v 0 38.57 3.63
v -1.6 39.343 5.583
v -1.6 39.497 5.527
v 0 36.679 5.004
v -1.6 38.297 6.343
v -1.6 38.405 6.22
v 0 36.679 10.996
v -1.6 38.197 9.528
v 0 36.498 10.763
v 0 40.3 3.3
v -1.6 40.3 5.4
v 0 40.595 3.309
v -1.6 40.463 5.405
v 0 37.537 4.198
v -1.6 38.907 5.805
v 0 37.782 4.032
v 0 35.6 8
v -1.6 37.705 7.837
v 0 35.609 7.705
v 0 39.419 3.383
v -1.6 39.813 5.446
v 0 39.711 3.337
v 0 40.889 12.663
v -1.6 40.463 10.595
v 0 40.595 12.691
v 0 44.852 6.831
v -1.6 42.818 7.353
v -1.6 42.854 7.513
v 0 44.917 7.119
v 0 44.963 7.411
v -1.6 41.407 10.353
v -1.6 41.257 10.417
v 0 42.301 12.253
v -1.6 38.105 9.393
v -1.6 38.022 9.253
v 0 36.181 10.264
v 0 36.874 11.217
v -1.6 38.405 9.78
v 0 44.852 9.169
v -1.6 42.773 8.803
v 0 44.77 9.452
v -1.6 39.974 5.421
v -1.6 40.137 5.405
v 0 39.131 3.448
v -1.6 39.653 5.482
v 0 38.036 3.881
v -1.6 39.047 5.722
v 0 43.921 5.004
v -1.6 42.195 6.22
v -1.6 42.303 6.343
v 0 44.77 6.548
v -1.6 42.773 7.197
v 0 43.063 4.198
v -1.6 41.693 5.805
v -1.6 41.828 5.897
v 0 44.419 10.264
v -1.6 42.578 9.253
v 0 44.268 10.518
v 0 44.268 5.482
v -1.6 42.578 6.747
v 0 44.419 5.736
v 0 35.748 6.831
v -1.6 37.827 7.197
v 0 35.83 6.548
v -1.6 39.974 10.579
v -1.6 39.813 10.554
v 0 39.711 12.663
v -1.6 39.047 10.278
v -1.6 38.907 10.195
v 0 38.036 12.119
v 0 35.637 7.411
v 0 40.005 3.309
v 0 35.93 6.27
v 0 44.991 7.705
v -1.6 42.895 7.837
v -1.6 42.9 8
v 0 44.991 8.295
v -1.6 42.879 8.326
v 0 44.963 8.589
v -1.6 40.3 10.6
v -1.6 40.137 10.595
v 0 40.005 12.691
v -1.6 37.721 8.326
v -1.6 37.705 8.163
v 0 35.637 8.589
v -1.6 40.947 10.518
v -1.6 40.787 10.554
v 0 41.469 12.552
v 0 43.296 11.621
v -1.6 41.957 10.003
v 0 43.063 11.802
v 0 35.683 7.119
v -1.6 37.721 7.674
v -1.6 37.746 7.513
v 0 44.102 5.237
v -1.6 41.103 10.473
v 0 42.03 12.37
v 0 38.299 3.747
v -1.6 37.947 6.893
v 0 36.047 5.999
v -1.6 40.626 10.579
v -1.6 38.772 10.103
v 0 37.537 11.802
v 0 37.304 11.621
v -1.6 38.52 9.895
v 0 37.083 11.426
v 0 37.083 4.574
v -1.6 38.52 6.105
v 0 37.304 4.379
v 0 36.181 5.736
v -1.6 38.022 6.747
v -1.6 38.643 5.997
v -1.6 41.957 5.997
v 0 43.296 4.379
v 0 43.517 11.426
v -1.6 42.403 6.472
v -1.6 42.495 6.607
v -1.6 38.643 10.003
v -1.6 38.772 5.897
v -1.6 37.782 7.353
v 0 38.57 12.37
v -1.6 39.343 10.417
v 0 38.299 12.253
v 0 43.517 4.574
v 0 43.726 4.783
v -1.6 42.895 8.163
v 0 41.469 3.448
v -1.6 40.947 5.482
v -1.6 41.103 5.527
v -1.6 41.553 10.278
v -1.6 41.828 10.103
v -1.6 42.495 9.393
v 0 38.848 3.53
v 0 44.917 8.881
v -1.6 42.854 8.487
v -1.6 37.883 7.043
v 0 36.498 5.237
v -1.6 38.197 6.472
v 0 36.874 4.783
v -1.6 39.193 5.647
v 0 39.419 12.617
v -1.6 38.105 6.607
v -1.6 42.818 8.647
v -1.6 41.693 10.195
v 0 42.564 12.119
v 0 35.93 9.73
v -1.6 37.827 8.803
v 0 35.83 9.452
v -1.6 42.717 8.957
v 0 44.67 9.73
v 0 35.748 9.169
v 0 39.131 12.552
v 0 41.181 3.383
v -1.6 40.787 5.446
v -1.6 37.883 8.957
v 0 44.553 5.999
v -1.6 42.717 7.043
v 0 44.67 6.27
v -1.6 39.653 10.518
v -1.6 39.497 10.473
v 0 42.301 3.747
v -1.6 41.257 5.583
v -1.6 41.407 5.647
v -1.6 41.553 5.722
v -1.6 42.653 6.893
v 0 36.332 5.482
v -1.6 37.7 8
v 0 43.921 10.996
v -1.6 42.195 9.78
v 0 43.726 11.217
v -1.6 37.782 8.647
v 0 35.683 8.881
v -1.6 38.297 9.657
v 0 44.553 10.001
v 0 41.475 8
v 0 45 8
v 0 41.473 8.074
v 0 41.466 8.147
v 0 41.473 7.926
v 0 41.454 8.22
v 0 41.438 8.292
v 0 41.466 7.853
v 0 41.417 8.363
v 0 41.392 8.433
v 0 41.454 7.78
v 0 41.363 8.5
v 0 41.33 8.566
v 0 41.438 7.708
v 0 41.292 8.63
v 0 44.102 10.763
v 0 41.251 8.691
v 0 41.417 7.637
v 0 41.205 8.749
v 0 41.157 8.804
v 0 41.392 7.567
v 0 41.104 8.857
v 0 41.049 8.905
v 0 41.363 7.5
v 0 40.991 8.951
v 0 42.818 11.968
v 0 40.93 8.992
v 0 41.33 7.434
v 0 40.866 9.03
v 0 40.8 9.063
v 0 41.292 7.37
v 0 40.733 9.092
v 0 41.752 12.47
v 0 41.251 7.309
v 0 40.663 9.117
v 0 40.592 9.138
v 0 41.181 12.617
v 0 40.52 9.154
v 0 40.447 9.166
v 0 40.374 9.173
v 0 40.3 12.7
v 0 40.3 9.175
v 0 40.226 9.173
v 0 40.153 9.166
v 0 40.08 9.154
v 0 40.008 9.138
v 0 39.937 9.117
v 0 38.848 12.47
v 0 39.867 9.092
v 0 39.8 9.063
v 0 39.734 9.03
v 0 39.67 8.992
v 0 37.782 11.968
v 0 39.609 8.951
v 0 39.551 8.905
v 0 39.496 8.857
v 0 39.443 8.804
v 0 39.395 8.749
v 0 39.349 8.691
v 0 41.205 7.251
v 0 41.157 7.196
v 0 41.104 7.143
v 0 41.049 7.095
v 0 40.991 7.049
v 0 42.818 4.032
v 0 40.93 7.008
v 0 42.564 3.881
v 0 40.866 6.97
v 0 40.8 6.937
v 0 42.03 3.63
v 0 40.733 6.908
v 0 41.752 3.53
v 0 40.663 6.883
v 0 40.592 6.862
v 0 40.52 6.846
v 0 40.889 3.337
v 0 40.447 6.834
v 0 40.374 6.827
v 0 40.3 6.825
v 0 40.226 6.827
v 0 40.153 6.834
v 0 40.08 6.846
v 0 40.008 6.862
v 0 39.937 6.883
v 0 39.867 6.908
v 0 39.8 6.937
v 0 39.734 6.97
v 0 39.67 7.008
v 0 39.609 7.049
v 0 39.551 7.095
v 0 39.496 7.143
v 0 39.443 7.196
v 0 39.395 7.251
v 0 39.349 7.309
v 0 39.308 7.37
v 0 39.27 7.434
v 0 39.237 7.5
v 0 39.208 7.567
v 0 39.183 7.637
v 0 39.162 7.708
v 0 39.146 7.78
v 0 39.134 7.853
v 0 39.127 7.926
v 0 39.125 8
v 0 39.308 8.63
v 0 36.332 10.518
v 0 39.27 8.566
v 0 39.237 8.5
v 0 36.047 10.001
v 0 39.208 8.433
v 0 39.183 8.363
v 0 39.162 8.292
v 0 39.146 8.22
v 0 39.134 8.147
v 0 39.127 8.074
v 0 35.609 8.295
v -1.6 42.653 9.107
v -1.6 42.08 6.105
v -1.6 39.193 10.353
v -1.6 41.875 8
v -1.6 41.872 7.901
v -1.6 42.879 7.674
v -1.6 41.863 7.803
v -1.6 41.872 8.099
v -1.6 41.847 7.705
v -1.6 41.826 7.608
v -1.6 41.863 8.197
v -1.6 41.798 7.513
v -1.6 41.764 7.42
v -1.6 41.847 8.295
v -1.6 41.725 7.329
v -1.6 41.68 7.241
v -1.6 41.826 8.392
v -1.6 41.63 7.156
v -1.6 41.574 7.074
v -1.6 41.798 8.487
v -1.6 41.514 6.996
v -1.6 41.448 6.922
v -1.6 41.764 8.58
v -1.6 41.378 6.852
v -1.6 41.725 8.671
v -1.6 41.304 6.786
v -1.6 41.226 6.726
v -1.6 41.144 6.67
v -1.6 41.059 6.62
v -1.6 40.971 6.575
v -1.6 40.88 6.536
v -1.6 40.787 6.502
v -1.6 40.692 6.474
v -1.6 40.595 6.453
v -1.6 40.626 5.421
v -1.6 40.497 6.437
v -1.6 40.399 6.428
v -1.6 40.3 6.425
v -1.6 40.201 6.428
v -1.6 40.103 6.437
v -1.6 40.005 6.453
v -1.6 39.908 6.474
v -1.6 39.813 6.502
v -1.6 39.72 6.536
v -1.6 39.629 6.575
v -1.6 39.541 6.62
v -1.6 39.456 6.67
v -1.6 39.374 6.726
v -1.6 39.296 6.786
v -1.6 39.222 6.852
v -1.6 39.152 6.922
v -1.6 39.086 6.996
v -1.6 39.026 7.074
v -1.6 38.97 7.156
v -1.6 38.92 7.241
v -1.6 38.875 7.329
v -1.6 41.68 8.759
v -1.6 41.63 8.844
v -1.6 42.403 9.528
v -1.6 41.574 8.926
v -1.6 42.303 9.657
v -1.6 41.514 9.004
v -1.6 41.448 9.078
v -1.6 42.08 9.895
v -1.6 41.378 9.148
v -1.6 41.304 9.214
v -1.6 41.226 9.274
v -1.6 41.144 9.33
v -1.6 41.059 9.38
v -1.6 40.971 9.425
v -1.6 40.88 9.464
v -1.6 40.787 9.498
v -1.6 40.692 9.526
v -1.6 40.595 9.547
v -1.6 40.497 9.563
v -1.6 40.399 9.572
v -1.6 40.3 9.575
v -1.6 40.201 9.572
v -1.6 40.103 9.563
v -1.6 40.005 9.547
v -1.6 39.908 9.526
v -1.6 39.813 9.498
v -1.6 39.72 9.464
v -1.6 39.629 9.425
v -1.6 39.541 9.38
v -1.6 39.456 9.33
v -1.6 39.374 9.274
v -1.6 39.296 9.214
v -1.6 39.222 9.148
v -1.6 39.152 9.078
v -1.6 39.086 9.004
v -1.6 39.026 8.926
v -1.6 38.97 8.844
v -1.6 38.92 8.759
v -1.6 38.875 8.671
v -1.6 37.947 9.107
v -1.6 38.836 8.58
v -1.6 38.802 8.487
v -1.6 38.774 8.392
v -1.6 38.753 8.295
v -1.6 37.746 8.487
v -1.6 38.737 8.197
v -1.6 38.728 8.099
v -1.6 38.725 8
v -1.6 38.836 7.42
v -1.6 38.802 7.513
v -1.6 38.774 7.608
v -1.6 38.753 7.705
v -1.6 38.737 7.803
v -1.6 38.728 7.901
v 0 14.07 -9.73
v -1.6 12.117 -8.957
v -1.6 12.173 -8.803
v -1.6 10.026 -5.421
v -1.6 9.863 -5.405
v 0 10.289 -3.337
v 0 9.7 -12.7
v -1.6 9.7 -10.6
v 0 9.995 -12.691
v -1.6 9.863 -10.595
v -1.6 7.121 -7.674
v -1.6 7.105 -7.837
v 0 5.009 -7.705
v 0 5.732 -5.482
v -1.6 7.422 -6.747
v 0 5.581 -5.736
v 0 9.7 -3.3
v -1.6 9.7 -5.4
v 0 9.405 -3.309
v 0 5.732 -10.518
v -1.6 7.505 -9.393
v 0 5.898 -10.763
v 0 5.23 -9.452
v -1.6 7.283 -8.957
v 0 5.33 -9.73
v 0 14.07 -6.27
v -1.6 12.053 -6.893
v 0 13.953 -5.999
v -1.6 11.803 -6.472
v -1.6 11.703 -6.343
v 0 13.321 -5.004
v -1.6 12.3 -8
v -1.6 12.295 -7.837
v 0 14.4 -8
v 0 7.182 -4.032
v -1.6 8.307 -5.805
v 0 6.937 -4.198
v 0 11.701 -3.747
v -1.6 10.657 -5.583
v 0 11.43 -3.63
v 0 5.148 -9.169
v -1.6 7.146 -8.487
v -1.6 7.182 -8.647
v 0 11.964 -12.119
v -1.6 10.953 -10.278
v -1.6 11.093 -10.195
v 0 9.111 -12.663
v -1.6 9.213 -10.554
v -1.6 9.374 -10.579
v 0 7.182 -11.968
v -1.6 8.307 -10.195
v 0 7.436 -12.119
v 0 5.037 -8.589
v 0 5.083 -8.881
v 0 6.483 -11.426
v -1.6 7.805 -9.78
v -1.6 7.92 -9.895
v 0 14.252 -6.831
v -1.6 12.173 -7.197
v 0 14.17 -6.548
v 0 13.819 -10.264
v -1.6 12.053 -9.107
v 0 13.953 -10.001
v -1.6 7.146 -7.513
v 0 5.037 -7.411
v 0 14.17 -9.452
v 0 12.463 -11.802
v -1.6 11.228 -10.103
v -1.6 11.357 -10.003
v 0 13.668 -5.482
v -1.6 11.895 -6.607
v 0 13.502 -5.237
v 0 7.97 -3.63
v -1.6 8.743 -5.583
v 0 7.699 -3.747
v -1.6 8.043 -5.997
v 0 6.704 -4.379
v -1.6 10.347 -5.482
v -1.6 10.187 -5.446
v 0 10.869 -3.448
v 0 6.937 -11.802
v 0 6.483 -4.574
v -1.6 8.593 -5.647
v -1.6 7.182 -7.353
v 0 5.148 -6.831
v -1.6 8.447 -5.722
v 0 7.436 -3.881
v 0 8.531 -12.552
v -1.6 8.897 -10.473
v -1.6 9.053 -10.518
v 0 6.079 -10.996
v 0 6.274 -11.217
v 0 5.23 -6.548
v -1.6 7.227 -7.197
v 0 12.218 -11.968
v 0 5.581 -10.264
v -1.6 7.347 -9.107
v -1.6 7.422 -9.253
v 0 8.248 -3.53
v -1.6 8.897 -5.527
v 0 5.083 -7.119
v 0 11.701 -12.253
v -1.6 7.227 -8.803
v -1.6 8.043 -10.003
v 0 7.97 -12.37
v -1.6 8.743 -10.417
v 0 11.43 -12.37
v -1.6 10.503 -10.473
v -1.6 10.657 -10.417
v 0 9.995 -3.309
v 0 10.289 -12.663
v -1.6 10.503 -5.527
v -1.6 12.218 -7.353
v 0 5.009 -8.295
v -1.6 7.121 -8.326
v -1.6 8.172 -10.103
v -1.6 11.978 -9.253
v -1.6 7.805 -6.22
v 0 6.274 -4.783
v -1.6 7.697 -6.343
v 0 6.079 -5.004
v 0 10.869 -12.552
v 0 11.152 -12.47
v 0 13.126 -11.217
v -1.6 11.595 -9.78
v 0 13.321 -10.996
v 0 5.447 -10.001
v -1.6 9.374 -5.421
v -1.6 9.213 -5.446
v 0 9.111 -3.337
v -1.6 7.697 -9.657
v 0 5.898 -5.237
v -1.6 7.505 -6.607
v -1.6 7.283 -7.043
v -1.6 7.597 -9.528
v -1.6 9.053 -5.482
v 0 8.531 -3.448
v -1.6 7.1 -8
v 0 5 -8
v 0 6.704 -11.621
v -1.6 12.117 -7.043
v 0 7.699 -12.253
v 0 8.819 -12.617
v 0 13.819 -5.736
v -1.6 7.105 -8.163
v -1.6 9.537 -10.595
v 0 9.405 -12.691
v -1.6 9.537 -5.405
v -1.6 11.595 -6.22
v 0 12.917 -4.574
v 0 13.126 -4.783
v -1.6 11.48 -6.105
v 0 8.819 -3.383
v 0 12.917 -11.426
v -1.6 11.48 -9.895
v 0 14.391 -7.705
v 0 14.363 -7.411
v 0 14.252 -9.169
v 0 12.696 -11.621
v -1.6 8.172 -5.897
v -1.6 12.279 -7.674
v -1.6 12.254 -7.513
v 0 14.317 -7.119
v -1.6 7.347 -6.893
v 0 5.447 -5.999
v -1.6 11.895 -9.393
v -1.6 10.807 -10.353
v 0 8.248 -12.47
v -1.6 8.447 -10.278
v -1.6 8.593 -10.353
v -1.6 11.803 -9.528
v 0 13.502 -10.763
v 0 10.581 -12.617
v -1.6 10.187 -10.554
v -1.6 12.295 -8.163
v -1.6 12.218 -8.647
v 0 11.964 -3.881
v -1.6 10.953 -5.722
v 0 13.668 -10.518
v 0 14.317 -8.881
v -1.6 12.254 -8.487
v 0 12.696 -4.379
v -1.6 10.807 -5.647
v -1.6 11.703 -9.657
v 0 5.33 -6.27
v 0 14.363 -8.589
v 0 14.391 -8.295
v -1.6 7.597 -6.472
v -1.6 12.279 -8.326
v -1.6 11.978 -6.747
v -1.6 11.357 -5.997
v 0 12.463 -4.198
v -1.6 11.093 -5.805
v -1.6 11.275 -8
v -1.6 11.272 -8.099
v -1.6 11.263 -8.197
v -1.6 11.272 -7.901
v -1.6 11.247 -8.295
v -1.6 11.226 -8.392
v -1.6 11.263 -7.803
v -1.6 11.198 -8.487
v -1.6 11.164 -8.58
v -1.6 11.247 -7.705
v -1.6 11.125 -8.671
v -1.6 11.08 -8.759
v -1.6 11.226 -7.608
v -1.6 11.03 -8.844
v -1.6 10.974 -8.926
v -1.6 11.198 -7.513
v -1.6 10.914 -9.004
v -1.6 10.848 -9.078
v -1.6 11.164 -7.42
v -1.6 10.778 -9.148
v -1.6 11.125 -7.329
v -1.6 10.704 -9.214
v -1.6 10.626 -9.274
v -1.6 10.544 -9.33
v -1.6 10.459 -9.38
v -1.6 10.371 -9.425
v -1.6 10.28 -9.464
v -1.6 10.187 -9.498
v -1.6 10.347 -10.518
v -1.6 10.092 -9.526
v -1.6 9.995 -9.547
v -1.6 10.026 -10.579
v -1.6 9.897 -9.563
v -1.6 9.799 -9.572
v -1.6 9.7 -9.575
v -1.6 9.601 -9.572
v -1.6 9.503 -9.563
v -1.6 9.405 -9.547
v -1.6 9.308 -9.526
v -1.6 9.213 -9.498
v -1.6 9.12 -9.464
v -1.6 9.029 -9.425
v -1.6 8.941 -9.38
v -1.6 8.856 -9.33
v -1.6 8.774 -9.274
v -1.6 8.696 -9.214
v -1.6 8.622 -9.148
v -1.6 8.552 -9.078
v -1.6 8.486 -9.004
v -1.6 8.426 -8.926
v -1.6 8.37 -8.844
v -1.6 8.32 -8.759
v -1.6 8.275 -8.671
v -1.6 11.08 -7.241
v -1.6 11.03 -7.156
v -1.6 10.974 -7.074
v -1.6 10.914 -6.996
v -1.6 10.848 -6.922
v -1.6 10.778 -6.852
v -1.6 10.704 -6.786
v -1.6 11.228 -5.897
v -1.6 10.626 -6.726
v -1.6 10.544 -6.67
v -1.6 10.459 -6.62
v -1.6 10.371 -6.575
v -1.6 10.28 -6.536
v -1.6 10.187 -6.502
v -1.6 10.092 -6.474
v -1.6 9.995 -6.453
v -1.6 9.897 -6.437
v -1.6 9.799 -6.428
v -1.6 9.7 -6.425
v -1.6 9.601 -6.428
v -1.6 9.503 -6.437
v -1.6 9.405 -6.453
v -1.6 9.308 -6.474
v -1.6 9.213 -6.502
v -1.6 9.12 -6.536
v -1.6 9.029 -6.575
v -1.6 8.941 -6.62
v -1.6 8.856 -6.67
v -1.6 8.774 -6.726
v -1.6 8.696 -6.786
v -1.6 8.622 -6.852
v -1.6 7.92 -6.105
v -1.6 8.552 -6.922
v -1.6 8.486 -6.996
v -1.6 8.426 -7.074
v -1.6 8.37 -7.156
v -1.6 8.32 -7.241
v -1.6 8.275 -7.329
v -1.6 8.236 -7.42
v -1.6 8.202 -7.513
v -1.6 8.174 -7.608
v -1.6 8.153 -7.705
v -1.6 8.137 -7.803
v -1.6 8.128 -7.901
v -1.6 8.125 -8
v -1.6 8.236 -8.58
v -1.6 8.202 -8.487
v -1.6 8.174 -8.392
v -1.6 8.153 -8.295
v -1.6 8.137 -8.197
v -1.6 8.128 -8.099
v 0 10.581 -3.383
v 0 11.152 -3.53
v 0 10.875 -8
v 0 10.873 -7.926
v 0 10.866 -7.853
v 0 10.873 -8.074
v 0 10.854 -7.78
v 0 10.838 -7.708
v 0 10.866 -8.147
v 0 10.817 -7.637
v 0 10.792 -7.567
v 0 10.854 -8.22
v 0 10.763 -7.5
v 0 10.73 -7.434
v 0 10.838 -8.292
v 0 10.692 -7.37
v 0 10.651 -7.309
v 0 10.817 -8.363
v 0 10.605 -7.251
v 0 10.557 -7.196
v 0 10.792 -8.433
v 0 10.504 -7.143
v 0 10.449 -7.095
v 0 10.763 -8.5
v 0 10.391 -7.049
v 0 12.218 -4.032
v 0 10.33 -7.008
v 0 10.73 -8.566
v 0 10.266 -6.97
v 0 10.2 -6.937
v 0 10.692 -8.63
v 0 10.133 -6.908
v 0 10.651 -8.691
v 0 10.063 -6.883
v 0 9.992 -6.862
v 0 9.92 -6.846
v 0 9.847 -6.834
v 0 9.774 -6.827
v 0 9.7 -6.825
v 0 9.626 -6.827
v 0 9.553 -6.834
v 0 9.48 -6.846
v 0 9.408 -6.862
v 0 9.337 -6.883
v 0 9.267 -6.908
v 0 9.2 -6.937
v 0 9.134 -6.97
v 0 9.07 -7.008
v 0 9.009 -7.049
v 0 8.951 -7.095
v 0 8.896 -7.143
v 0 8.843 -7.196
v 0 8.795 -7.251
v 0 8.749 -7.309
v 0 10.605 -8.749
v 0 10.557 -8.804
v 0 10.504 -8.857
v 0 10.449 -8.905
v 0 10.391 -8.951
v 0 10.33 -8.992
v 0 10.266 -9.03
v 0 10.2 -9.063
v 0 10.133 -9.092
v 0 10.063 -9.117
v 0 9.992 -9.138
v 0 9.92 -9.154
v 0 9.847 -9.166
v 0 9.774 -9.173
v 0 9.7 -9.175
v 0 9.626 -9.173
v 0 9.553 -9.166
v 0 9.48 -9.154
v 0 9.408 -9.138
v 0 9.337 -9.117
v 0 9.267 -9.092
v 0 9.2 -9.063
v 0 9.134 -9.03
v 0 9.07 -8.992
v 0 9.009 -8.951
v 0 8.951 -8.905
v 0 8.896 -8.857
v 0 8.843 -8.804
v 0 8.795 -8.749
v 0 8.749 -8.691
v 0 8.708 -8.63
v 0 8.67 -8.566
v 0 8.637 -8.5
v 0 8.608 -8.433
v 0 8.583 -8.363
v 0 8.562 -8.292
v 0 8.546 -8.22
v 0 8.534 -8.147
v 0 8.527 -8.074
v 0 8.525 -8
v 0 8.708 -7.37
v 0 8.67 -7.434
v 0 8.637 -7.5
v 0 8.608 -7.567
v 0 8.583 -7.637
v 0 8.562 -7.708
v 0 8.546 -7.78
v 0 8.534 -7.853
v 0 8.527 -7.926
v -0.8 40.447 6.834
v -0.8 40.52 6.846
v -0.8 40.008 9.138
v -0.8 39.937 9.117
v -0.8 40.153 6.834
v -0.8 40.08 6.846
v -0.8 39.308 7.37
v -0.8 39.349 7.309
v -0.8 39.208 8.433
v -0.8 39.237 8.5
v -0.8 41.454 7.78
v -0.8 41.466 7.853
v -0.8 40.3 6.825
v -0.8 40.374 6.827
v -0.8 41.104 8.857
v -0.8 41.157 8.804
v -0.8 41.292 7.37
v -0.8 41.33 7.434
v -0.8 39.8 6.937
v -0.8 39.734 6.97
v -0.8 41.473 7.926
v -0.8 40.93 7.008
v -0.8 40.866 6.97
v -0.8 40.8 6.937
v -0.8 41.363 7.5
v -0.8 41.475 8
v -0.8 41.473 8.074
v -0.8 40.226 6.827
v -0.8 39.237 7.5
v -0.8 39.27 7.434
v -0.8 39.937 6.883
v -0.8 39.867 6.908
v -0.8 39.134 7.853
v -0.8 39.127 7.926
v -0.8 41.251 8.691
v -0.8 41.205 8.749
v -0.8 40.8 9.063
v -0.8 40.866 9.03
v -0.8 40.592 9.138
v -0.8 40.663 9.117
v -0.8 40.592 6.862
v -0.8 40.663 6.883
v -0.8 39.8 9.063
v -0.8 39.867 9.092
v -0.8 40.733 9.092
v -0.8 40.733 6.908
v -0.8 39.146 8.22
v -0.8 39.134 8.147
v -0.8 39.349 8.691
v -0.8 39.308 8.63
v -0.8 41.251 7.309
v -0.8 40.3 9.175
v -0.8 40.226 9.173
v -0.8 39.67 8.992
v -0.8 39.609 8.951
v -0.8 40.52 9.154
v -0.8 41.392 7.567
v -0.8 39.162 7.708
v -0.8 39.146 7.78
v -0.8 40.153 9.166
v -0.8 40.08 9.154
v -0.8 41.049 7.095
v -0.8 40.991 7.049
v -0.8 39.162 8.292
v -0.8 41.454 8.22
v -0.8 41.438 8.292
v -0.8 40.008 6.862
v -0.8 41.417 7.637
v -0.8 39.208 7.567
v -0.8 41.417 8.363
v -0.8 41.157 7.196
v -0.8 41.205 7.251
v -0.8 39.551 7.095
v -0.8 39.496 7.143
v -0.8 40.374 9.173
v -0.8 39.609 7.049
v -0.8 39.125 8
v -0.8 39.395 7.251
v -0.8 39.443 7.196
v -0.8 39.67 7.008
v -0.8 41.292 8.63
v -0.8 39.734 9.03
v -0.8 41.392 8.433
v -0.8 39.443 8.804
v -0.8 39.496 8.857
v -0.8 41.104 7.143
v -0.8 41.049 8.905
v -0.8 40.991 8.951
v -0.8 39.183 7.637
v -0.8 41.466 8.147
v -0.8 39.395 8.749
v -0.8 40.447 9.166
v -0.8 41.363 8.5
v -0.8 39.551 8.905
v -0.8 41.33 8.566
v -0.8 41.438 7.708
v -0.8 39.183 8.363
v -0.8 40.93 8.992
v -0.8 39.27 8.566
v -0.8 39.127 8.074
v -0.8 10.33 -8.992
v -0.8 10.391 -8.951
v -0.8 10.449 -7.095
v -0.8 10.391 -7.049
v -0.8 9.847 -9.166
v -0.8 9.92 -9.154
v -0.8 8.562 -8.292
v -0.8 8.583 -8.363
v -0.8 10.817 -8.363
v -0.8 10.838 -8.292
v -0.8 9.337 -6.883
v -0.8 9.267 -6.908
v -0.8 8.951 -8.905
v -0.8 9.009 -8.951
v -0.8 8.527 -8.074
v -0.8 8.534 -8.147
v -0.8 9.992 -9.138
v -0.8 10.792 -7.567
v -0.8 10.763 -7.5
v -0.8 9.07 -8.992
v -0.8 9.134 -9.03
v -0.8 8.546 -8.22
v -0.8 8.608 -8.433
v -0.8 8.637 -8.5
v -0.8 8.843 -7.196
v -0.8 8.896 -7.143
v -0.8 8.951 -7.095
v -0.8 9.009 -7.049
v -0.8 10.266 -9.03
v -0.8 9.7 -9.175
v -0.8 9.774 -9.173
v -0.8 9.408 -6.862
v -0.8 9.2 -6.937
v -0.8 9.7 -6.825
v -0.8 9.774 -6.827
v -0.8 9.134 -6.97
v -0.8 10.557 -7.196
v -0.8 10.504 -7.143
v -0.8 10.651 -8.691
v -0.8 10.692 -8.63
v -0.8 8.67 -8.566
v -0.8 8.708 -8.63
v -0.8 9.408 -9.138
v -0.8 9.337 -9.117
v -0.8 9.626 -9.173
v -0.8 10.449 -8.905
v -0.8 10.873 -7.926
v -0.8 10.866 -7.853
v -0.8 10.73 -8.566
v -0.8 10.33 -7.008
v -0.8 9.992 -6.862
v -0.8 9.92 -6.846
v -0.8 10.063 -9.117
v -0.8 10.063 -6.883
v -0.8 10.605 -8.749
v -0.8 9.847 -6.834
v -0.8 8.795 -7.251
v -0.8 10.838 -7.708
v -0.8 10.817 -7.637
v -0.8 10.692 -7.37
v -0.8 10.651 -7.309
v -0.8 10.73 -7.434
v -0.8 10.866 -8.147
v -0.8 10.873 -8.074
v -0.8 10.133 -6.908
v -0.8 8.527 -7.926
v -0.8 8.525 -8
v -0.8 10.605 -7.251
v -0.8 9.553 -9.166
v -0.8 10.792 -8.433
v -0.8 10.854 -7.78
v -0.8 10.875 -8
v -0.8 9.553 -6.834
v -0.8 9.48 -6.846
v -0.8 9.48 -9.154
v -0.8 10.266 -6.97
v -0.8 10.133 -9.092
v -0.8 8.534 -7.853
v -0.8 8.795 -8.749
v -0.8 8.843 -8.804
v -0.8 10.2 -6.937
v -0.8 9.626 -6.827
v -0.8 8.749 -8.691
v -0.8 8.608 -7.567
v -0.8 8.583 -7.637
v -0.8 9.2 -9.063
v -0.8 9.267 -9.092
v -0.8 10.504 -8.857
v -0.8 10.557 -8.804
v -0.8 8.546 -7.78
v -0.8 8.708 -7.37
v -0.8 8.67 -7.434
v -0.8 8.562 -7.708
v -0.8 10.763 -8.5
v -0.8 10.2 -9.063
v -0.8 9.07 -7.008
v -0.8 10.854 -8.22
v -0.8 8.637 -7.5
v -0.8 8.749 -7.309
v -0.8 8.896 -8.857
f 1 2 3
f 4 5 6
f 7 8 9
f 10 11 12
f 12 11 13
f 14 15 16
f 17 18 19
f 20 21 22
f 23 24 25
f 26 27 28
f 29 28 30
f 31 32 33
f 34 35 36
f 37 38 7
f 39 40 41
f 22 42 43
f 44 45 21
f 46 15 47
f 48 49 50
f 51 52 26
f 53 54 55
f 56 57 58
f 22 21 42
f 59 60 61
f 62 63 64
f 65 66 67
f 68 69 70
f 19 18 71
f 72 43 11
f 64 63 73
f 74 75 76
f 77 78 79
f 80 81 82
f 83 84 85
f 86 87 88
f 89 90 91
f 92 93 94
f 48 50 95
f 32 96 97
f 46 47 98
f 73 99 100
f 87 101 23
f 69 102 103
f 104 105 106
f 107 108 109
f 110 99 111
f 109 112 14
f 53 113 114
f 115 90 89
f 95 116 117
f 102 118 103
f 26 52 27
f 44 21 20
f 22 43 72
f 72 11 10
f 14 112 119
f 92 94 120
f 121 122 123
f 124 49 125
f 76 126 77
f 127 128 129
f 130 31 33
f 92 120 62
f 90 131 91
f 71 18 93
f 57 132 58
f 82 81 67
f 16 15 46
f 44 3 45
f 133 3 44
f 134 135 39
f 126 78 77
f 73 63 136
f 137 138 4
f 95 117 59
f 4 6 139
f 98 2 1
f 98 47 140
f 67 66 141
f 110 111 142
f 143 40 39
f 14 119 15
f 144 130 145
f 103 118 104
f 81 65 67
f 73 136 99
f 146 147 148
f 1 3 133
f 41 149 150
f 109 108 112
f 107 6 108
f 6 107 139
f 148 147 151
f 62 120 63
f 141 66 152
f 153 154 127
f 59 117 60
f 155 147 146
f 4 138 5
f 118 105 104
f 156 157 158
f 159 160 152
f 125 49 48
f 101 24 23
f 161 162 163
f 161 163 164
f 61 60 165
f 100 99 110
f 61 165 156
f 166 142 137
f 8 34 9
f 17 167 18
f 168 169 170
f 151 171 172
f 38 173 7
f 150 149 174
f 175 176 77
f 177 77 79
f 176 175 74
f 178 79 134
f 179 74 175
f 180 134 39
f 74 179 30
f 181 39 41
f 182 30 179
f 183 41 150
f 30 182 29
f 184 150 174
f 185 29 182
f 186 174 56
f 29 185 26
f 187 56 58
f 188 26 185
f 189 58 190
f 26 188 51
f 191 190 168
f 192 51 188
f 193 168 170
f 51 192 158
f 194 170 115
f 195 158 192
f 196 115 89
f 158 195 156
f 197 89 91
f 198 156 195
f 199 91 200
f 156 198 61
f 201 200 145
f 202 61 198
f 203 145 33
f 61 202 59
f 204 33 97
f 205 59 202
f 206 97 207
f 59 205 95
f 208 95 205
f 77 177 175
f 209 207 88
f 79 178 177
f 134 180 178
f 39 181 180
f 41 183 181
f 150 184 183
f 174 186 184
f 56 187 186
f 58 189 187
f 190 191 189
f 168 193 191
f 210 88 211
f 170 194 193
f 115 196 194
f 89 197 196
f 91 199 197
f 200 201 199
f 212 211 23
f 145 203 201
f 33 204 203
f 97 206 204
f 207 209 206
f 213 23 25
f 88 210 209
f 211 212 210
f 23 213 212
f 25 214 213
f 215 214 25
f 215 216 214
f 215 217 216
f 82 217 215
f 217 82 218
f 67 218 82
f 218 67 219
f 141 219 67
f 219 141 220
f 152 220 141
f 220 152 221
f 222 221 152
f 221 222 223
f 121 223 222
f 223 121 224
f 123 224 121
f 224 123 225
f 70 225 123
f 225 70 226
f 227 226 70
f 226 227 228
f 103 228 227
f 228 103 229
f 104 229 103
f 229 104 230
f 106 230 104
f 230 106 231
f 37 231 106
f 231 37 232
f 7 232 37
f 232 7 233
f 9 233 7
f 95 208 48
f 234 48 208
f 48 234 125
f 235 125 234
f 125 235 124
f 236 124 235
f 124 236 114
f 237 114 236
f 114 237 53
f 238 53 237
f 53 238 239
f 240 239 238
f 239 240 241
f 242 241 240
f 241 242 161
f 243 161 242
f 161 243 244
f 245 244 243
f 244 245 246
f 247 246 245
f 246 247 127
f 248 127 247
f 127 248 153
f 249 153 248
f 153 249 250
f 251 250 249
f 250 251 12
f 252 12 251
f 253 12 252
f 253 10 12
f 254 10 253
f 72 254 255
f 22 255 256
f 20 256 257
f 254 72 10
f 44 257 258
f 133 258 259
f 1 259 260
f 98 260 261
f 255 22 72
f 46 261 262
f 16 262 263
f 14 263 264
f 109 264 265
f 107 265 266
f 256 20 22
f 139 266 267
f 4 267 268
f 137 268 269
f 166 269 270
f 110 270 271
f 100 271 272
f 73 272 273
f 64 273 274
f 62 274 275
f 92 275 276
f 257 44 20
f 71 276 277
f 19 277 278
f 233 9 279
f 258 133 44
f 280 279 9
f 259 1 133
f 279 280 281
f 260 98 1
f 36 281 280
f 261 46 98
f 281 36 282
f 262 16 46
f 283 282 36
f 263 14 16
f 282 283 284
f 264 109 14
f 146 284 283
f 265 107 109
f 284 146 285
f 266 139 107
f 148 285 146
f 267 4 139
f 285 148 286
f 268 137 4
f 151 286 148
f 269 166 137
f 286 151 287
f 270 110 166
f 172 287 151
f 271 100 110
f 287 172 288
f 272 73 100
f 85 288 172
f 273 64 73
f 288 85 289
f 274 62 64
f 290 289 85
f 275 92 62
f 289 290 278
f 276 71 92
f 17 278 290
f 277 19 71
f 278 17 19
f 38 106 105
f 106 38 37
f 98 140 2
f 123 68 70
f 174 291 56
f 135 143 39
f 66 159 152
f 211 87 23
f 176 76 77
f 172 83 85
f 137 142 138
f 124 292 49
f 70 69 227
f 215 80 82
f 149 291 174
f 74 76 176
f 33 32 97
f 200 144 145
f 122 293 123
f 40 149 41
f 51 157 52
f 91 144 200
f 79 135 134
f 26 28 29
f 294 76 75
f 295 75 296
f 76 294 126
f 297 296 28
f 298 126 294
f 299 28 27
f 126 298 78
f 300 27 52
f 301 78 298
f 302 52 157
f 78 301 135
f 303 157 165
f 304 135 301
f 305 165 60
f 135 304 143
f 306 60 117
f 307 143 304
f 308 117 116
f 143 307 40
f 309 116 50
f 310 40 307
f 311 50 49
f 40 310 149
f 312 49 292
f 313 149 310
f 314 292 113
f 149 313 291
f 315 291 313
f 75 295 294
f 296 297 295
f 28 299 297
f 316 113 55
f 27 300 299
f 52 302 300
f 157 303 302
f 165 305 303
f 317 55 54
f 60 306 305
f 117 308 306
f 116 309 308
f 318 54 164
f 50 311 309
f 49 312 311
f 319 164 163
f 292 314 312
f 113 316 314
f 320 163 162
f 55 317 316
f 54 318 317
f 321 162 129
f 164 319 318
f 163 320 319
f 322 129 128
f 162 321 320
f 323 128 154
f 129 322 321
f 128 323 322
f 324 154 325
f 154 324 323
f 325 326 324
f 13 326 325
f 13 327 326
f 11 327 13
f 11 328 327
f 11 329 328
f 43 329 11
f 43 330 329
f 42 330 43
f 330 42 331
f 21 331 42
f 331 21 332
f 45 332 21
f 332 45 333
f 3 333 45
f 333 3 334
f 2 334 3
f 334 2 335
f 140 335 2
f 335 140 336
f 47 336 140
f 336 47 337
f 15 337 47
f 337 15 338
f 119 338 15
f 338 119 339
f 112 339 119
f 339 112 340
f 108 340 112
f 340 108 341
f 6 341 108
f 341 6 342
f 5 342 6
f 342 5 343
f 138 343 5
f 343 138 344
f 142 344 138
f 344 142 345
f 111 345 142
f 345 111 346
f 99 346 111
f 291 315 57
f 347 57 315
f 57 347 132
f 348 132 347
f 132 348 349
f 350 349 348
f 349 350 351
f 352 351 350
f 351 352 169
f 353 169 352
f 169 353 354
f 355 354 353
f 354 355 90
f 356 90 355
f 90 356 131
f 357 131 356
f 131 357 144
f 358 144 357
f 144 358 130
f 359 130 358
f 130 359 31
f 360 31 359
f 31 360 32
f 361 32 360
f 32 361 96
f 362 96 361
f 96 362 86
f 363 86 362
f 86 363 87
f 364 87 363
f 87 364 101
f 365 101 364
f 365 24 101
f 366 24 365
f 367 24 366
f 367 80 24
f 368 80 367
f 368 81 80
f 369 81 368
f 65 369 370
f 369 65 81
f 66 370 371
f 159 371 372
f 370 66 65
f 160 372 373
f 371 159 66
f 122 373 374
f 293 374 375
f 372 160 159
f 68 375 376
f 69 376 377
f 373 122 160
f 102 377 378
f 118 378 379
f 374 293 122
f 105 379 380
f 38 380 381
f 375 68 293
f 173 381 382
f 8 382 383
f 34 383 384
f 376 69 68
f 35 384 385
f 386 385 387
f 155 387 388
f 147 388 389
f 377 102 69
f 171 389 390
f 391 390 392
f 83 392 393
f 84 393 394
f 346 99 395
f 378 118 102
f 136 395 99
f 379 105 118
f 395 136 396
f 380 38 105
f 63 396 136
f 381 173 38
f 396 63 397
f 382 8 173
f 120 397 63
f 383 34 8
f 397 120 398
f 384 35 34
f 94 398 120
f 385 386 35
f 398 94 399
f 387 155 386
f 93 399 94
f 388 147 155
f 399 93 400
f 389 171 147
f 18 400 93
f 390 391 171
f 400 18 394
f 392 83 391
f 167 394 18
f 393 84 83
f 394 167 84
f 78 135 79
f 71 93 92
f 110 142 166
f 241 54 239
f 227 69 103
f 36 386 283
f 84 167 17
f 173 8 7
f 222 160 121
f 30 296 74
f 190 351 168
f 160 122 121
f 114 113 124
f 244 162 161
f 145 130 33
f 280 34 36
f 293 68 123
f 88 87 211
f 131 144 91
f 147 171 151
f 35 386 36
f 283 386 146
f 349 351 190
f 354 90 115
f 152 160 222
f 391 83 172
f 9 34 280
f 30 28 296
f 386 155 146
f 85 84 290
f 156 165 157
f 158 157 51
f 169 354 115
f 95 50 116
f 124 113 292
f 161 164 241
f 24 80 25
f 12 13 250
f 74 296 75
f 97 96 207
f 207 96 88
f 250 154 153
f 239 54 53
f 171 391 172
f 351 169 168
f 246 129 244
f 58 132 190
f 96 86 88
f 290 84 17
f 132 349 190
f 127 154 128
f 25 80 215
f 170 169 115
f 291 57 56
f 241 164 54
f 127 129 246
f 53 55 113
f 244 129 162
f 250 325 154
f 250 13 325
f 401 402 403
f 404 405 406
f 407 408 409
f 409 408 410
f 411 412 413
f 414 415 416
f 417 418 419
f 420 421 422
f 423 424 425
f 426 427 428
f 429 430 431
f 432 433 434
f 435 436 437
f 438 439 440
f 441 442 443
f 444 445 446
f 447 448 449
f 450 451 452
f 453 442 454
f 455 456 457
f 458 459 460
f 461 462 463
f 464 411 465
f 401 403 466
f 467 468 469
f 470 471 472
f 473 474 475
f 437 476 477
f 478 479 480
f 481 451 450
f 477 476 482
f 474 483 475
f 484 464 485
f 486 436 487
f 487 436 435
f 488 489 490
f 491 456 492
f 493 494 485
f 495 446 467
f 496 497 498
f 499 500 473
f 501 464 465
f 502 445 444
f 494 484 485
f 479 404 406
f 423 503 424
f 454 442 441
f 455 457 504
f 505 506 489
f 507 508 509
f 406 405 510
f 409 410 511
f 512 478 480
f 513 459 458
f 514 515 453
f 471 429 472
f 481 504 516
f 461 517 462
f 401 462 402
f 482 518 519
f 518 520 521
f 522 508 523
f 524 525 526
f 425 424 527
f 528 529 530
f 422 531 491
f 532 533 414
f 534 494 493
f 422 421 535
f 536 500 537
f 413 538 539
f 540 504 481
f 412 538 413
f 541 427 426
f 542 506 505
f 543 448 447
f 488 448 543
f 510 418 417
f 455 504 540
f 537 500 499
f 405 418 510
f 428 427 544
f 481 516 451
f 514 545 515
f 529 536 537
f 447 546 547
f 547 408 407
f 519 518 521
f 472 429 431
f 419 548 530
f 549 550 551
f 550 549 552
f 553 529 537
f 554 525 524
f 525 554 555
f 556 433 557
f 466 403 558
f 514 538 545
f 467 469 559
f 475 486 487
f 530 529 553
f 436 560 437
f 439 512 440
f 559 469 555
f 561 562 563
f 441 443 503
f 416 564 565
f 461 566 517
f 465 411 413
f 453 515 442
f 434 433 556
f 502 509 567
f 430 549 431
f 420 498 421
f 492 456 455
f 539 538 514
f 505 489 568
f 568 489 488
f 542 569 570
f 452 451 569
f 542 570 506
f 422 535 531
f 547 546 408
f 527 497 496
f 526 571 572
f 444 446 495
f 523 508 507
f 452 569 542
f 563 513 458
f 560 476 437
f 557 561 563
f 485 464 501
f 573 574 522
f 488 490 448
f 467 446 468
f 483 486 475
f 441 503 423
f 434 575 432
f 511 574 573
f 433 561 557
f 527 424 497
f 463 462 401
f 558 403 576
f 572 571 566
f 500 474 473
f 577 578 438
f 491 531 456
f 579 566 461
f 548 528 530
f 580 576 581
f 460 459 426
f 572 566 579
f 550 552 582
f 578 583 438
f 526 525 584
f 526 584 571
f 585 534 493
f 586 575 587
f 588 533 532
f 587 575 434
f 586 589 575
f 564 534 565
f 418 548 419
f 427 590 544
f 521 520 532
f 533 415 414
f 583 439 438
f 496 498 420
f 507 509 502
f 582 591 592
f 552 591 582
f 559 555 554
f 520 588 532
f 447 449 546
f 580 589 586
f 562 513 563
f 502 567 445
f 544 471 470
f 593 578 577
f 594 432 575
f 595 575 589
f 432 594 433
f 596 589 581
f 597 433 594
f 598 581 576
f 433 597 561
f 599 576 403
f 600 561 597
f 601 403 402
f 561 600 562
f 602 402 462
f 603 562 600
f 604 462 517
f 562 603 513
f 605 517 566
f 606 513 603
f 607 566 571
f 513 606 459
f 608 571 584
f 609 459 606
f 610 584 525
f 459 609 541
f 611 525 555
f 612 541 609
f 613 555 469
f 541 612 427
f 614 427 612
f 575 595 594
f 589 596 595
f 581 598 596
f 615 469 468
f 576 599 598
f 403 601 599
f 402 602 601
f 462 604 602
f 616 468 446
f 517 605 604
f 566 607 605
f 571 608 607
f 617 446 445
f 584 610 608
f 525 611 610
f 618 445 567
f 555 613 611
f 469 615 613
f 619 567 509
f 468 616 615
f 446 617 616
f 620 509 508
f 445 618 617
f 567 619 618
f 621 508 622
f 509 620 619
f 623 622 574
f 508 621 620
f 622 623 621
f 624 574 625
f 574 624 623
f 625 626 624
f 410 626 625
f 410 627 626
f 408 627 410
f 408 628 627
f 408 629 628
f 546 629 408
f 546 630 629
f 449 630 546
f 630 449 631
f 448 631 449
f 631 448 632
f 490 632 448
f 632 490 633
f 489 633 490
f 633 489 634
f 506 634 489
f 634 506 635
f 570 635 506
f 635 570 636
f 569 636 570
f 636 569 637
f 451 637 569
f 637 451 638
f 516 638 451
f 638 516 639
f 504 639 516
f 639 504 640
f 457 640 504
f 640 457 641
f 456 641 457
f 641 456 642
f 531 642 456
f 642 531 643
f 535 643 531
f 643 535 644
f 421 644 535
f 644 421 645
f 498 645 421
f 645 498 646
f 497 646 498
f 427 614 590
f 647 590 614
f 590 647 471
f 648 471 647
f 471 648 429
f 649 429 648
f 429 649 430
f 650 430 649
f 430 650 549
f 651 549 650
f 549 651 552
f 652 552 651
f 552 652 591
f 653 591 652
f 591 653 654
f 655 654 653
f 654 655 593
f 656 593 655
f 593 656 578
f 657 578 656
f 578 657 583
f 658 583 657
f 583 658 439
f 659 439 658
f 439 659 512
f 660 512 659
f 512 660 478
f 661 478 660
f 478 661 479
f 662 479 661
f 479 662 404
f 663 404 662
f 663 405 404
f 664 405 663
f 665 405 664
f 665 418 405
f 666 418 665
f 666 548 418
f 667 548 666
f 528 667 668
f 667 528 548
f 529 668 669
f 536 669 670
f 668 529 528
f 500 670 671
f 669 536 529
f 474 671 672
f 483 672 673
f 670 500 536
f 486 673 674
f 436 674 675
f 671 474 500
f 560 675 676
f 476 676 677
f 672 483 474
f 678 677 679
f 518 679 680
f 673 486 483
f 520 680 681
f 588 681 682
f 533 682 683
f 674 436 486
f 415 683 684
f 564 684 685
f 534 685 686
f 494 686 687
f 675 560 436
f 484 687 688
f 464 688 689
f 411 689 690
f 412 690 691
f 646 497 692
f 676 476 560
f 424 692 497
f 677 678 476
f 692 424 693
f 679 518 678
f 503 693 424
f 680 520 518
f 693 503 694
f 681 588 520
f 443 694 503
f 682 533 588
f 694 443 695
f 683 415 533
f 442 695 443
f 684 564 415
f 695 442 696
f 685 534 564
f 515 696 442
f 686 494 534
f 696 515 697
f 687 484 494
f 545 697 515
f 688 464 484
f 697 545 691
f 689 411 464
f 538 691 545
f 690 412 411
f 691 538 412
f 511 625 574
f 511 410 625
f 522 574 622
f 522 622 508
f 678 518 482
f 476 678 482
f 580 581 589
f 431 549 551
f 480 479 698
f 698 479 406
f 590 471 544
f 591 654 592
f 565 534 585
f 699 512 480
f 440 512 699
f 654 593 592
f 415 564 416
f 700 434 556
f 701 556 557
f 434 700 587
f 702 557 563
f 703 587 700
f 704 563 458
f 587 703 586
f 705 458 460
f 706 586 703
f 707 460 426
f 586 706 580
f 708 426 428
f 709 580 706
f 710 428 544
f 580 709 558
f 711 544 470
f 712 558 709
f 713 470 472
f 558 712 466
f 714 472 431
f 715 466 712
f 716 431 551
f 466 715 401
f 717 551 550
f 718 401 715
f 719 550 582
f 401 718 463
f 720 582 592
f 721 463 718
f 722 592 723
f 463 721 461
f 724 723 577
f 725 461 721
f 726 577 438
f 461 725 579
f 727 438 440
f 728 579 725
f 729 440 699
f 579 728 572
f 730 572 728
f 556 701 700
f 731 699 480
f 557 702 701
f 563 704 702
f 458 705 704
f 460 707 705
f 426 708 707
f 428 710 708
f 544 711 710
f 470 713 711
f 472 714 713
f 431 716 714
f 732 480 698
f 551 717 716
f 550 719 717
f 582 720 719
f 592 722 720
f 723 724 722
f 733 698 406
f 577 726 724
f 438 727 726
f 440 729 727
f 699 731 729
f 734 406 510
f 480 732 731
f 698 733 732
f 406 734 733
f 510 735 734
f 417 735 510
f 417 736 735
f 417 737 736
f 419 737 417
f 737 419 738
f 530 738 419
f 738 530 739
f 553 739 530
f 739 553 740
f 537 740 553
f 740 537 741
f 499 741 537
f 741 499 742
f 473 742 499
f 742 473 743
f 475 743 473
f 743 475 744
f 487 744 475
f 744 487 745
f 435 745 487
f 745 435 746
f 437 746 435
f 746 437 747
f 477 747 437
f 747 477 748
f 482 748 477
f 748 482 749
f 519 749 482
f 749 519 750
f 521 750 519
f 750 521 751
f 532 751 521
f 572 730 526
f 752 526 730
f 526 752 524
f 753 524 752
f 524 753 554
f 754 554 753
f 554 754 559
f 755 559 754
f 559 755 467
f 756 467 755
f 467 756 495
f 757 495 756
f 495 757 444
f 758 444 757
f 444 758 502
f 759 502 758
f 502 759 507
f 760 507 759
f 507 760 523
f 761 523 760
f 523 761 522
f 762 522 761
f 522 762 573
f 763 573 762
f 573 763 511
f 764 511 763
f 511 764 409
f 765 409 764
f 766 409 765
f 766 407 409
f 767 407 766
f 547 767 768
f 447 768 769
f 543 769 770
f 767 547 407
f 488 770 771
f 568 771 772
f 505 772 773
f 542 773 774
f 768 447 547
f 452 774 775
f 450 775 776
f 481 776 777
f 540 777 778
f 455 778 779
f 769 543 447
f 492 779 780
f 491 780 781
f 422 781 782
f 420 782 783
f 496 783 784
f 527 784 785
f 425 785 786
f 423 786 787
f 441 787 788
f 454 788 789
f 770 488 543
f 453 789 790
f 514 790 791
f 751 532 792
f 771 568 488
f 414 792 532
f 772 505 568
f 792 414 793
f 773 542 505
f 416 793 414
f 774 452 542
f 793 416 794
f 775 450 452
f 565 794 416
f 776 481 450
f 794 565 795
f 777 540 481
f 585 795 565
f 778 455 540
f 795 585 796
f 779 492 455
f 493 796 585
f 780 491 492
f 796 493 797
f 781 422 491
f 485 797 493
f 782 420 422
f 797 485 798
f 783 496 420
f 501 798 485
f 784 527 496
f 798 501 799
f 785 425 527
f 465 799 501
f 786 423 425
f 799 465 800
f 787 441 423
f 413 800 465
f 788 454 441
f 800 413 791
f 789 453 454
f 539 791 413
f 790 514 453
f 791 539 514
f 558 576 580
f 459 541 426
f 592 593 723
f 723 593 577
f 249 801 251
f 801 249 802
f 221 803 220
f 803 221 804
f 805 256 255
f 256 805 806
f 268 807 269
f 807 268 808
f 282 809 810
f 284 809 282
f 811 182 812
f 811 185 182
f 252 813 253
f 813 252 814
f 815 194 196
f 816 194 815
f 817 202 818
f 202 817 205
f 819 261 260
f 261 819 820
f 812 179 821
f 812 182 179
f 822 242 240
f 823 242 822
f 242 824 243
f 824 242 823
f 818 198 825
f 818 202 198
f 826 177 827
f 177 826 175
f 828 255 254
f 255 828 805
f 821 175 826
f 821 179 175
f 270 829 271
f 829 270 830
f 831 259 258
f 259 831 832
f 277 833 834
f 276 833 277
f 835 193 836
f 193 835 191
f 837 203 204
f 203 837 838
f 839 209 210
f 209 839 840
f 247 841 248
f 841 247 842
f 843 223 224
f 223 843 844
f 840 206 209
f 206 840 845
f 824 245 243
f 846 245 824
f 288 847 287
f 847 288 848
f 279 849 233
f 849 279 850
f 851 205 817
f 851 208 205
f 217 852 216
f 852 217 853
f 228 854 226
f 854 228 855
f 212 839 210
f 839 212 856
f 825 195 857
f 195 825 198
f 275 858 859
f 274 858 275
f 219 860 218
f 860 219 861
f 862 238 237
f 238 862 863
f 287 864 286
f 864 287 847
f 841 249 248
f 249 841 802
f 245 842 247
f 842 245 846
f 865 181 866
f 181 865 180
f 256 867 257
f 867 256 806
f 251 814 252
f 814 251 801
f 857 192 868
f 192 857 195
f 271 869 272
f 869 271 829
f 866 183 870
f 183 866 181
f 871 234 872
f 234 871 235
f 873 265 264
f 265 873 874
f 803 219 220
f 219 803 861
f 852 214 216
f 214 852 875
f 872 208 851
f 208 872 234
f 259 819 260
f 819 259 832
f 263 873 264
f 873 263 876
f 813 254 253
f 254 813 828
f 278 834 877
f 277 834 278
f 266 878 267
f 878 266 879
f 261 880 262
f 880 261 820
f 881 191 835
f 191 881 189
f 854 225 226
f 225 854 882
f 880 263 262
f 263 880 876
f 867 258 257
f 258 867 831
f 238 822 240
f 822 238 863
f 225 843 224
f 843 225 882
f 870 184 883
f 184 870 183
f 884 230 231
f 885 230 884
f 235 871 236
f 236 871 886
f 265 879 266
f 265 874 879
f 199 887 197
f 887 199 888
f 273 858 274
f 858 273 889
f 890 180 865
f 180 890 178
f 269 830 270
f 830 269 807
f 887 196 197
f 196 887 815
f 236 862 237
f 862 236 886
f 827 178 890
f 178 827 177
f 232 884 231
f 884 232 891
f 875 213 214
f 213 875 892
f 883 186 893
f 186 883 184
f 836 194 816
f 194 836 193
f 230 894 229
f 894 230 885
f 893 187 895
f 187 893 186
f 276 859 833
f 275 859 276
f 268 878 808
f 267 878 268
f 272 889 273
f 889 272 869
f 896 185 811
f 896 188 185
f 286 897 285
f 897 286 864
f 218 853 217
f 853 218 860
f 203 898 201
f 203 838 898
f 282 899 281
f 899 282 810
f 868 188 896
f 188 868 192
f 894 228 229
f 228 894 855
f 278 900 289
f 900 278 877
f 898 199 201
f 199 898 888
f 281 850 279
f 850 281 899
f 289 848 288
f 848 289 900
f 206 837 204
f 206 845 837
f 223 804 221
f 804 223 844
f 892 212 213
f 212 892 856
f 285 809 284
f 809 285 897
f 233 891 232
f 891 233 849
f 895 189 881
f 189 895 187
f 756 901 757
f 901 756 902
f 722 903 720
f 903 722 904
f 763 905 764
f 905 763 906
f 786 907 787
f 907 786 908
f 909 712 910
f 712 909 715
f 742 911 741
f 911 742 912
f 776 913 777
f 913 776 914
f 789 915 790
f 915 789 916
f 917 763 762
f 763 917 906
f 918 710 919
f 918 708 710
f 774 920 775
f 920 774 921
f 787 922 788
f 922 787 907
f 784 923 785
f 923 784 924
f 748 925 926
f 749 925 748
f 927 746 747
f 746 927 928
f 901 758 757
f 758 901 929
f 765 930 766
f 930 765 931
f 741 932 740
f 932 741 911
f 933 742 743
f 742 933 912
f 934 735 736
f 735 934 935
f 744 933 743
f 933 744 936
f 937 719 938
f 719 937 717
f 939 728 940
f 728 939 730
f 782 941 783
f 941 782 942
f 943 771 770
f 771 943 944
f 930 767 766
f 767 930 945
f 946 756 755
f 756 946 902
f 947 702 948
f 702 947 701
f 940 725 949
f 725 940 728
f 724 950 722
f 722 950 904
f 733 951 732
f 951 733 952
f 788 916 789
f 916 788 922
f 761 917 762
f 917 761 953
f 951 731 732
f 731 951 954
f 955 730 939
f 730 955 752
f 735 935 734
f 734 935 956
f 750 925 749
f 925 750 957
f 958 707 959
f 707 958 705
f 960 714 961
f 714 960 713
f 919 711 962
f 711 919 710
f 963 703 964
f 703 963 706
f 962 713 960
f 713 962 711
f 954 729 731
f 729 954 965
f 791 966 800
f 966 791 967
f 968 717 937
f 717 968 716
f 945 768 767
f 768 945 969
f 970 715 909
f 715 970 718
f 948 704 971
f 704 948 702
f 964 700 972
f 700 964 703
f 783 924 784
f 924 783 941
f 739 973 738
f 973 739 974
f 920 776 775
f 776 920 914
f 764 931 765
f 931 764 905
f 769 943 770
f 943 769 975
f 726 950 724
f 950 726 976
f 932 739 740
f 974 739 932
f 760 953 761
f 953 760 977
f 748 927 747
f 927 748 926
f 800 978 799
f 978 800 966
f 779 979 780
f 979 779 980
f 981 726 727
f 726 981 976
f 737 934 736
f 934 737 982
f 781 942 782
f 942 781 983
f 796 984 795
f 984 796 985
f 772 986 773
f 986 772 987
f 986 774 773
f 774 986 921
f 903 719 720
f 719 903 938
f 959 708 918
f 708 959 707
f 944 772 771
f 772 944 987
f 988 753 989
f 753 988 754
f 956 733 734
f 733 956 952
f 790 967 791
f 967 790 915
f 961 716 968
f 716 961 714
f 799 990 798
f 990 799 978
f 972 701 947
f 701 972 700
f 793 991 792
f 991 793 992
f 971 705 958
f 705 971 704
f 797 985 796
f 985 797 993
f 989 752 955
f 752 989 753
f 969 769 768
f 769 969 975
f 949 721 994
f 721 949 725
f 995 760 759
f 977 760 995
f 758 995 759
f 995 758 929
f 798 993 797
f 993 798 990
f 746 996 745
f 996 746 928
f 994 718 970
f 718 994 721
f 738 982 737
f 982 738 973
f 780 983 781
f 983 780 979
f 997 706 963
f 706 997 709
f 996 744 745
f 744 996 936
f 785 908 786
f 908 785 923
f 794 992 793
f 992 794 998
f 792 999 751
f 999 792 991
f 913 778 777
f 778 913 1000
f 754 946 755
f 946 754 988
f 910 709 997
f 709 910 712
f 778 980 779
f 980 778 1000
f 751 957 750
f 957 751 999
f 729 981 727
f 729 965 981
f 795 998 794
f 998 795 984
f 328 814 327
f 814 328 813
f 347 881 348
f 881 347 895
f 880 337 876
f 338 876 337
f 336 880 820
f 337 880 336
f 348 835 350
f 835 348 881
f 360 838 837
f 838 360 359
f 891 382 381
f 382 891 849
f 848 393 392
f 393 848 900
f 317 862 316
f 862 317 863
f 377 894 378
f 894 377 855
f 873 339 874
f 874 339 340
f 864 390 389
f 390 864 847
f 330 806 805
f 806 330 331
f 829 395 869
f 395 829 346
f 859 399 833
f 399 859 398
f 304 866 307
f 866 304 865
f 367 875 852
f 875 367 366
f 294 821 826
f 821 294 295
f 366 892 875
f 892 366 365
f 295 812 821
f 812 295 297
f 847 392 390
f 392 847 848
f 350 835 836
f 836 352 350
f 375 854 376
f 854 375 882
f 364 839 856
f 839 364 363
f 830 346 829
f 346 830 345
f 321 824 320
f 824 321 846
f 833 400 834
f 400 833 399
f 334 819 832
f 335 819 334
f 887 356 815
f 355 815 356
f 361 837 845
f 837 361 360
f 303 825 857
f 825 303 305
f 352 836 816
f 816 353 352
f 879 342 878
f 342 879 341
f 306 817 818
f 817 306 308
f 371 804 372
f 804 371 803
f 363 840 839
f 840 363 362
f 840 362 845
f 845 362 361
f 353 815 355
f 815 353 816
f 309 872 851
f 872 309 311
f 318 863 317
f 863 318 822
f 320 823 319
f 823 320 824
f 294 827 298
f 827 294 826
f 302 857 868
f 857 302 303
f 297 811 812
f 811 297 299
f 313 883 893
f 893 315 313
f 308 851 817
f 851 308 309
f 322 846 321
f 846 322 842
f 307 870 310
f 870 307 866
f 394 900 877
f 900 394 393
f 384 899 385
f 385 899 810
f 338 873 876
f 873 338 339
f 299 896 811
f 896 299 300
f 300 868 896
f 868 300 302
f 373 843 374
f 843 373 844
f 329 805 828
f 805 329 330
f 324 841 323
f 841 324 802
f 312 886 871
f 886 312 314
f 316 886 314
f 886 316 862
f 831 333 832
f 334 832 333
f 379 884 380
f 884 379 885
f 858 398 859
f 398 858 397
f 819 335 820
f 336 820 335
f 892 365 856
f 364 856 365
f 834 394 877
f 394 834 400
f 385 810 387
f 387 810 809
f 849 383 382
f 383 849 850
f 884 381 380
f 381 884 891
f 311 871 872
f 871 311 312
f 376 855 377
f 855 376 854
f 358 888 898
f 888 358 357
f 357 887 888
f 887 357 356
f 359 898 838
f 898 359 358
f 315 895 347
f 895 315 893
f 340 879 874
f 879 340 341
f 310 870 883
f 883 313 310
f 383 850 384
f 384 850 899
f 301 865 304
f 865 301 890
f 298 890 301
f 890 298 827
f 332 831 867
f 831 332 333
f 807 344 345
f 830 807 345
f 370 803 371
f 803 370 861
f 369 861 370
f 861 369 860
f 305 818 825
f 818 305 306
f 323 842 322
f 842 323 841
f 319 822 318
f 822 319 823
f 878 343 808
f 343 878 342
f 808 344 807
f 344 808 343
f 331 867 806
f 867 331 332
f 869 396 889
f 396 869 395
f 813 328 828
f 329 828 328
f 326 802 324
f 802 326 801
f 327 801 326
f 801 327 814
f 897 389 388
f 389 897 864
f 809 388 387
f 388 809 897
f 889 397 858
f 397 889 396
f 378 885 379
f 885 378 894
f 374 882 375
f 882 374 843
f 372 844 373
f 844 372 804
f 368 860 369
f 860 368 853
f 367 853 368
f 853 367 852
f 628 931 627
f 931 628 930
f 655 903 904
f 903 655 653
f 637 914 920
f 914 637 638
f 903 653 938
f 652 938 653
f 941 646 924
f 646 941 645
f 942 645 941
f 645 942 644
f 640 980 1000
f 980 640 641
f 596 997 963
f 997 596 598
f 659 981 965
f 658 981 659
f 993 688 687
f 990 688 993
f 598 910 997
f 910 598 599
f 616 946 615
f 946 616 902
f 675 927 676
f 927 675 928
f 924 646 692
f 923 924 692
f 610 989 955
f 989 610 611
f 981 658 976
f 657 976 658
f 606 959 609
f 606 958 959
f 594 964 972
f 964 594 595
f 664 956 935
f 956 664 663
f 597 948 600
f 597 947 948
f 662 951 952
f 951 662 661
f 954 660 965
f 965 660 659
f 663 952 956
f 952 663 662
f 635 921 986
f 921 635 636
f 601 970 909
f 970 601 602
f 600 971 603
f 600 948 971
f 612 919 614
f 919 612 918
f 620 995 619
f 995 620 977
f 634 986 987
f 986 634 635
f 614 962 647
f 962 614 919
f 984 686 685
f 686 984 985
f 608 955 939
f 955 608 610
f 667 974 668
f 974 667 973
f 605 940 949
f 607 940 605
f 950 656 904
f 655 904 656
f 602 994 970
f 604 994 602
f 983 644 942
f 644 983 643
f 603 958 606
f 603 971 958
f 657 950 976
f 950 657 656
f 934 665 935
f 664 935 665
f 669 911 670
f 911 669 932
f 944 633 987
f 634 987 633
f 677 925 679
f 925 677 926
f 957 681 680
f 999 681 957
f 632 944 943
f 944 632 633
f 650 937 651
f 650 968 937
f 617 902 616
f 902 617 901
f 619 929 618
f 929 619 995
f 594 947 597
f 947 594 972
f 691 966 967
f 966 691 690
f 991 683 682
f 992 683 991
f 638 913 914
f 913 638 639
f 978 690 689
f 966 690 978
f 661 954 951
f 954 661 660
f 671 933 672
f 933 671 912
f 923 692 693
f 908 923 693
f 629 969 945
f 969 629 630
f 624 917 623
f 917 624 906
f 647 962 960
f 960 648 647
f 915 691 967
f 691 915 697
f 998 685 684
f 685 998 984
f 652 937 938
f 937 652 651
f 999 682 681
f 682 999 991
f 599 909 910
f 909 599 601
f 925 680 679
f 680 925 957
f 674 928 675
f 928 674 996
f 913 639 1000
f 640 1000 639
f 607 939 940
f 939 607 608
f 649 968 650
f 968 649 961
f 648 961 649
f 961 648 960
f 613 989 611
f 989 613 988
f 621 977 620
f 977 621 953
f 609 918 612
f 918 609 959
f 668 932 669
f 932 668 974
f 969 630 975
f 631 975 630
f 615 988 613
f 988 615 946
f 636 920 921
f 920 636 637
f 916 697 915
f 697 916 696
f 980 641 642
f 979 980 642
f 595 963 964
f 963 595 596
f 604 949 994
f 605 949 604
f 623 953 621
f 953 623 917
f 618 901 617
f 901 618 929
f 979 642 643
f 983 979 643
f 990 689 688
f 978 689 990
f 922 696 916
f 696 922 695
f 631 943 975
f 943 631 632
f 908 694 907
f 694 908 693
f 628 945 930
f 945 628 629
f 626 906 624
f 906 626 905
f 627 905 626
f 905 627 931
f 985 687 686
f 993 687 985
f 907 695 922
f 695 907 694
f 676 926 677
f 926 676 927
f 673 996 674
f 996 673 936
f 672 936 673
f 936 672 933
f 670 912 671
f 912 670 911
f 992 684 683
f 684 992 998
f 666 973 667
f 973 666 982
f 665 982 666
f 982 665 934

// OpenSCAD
CLIP_HEIGHT = 25.4;
MOUNT_HEIGHT = 1.6;
MOUNT_DIAMETER = 5.2;
MOUNT_HOLE_DIAMETER = 2.35;
MOUNT_HOLE_45CHAMFER = 0.4;
MOUNT_HOLE_DEPTH = 10;

$fn = 100;

// LM2596 mounting dimensions
X_OFFSET = 16;
Y_OFFSET = 30.6;

BASE_RAD = 0.5*CLIP_HEIGHT - (X_OFFSET*0.5);

module din_clip() {
    difference() {
        translate([0,0,0]) {
            union() {
                translate([-0.2,0,0]) linear_extrude(height=CLIP_HEIGHT, center=true, convexity=5) {
                    import(file="din_clip_01.dxf", layer="0");
                }
            }        
            union() {
        
                translate([-MOUNT_HEIGHT, 25+Y_OFFSET*0.5, X_OFFSET*0.5]) {
                    rotate([0, 90, 0]) {
                        cylinder(h= MOUNT_HEIGHT, r1 = MOUNT_DIAMETER / 2, r2 = BASE_RAD);
                    }
                }
        
                translate([-MOUNT_HEIGHT, 25-Y_OFFSET*0.5, -X_OFFSET*0.5]) {
                    rotate([0, 90, 0]) {
                        cylinder(h= MOUNT_HEIGHT, r1 = MOUNT_DIAMETER / 2, r2 = BASE_RAD);
                    }
                }
            }
        }
        union() {
        
                translate([-MOUNT_HEIGHT, 25+Y_OFFSET*0.5, X_OFFSET*0.5]) {
                    rotate([0, 90, 0]) {
                        cylinder(h= MOUNT_HOLE_DEPTH, d = MOUNT_HOLE_DIAMETER);
                    }
                }
        
                translate([-MOUNT_HEIGHT, 25-Y_OFFSET*0.5, -X_OFFSET*0.5]) {
                    rotate([0, 90, 0]) {
                        cylinder(h= MOUNT_HOLE_DEPTH, d = MOUNT_HOLE_DIAMETER);
                    }
                }
                translate([-MOUNT_HEIGHT, 25+Y_OFFSET*0.5, X_OFFSET*0.5]) {
                    rotate([0, 90, 0]) {
                        cylinder(h= MOUNT_HOLE_DIAMETER+2*MOUNT_HOLE_45CHAMFER, d1 = MOUNT_HOLE_DIAMETER+2*MOUNT_HOLE_45CHAMFER, d2 = 0);
                    }
                }
        
                translate([-MOUNT_HEIGHT, 25-Y_OFFSET*0.5, -X_OFFSET*0.5]) {
                    rotate([0, 90, 0]) {
                        cylinder(h= MOUNT_HOLE_DIAMETER+2*MOUNT_HOLE_45CHAMFER, d1 = MOUNT_HOLE_DIAMETER+2*MOUNT_HOLE_45CHAMFER, d2 = 0);
                    }
                }
            }
    }
}

din_clip();
